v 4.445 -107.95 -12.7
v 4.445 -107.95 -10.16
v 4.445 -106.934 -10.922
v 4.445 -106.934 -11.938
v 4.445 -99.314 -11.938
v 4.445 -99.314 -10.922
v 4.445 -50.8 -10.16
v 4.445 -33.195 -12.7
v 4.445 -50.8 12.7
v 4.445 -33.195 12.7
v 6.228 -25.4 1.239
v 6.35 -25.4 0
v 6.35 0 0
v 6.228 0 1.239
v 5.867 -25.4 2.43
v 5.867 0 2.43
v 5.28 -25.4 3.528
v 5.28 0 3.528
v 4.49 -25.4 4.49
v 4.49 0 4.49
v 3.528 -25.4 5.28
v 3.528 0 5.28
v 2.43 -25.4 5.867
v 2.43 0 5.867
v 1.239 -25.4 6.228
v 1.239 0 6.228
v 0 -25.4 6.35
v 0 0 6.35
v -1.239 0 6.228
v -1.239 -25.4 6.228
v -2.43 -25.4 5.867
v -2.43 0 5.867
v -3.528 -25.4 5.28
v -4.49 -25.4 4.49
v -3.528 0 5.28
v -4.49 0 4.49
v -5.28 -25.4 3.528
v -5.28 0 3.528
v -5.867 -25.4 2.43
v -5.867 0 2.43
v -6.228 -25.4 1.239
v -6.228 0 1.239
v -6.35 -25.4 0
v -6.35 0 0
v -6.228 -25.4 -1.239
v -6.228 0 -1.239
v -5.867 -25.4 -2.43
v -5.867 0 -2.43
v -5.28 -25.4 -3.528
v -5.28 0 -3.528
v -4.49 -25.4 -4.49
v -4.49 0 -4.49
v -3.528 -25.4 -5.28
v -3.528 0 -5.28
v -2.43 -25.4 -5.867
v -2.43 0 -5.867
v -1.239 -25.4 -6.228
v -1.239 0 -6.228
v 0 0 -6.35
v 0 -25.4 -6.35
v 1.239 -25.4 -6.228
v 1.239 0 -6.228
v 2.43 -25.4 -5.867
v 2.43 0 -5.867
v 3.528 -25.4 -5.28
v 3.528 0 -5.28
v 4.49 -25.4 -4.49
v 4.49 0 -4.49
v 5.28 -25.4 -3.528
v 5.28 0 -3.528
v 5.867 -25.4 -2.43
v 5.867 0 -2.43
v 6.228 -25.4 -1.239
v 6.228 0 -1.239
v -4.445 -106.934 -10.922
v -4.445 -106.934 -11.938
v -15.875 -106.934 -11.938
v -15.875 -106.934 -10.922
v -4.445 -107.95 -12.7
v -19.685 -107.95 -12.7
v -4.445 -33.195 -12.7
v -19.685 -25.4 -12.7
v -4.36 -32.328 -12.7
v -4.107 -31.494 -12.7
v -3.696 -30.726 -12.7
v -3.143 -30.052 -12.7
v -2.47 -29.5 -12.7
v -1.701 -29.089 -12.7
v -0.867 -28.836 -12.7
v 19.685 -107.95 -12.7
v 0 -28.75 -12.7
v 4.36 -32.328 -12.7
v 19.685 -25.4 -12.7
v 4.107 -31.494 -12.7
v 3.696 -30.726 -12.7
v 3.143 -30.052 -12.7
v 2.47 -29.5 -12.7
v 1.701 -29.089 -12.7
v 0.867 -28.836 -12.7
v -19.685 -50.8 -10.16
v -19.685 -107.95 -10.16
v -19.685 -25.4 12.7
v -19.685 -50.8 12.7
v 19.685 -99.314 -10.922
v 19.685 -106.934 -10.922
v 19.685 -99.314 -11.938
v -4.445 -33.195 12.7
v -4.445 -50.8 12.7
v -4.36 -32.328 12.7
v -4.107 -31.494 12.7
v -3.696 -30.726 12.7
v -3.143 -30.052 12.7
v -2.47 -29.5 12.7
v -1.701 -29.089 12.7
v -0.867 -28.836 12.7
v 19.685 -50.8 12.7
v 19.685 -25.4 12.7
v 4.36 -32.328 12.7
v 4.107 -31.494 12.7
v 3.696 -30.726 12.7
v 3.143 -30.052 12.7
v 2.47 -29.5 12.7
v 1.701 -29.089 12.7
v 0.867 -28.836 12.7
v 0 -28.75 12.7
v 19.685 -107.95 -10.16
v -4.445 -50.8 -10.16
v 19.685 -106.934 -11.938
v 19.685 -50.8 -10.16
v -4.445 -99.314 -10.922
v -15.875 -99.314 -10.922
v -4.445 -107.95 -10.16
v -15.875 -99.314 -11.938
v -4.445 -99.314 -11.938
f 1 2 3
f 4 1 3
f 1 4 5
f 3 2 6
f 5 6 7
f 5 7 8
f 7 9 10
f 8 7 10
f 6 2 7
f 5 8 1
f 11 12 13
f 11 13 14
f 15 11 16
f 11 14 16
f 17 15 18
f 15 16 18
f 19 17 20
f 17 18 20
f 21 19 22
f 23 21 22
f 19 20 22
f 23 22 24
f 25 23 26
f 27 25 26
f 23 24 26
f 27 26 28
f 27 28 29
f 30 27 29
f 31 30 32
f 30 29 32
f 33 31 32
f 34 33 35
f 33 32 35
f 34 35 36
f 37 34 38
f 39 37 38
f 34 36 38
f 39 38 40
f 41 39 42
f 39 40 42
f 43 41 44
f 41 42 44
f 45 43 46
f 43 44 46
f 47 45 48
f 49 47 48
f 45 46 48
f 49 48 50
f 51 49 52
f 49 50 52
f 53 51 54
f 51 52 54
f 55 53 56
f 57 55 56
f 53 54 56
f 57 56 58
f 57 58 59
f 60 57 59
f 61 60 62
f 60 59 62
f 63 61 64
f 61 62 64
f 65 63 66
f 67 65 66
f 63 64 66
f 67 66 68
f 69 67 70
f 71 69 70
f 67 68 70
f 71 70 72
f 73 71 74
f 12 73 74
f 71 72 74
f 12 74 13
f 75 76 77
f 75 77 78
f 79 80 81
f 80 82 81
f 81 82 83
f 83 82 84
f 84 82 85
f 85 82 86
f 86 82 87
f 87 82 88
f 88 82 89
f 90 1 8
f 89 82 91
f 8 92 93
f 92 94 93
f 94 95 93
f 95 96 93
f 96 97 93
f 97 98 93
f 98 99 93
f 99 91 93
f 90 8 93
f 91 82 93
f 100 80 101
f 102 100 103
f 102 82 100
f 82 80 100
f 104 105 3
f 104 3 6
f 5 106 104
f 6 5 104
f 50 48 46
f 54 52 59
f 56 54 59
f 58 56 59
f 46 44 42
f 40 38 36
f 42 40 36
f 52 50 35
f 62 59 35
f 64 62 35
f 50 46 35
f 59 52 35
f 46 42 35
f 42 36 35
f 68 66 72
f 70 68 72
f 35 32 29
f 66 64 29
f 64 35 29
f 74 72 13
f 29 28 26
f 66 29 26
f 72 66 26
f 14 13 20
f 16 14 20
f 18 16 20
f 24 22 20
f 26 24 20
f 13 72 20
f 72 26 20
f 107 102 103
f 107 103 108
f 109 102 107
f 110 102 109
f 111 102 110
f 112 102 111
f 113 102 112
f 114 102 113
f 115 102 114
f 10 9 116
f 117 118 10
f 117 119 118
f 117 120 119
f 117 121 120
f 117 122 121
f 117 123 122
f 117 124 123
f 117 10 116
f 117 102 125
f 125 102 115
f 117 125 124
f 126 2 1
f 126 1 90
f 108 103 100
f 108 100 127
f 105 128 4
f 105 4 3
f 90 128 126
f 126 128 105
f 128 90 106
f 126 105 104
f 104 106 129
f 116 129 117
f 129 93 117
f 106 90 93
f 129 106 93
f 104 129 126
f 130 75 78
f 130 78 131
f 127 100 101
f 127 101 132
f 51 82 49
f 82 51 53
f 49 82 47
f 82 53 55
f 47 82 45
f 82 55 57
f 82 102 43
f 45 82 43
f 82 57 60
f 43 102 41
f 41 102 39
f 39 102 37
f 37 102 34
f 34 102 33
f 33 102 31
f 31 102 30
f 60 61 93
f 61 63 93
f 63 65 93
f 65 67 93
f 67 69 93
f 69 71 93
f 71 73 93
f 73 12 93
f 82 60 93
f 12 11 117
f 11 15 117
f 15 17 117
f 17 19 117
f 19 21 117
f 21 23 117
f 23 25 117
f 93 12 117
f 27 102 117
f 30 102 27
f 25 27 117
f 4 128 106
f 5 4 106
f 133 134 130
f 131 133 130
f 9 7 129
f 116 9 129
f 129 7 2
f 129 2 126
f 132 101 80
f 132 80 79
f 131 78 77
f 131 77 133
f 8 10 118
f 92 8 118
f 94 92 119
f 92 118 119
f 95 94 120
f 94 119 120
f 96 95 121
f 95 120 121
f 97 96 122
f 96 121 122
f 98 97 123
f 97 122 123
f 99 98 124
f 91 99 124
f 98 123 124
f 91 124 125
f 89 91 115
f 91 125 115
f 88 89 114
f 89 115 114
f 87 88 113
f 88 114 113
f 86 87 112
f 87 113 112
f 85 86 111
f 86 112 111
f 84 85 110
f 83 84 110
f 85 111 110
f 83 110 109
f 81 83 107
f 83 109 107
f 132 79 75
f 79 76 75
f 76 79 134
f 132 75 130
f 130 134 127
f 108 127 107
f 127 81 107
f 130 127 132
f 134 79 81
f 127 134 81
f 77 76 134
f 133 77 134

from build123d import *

# Parameters (mm, degrees)
F0_R     = 6.35
F1_DEPTH = 25.4
F2_W     = 39.37
F2_H     = 25.4
F3_DEPTH = 25.4
F5_DEPTH = 25.4
F6_W     = 15.24
F6_H     = 2.54
F7_DEPTH = 57.15
F8_W     = 7.62
F8_H     = 1.016
F9_DEPTH = 35.56


with BuildPart() as f1:
    # F0 (on Front) → F1 (new body)
    with BuildSketch(Plane.XZ):
        Circle(F0_R)
    extrude(amount=F1_DEPTH)

    # F2 (on face) → F3 (join)
    with BuildSketch(Plane.XZ.offset(25.4)):
        Rectangle(F2_W, F2_H)
    extrude(amount=F3_DEPTH)

    # F4 (on face) → F5 (cut)
    with BuildSketch(Plane.XY.offset(12.7)):
        with BuildLine():
            Line((-4.445, -33.1953875721), (-4.445, -50.8))
            Line((-4.445, -50.8), (4.445, -50.8))
            Line((4.445, -50.8), (4.445, -33.1953875721))
            ThreePointArc((4.445, -33.1953875721), (0, -37.6403875721), (-4.445, -33.1953875721))
        make_face()
        with BuildLine():
            ThreePointArc((4.445, -33.1953875721), (0, -28.7503875721), (-4.445, -33.1953875721))
            Line((-4.445, -33.1953875721), (4.445, -33.1953875721))
        make_face()
        with BuildLine():
            Line((4.445, -33.1953875721), (-4.445, -33.1953875721))
            ThreePointArc((-4.445, -33.1953875721), (0, -37.6403875721), (4.445, -33.1953875721))
        make_face()
    extrude(amount=-F5_DEPTH, mode=Mode.SUBTRACT)

    # F6 (on face) → F7 (join)
    with BuildSketch(Plane.XZ.offset(50.8)):
        with Locations((-12.065, -11.43)):
            Rectangle(F6_W, F6_H)
        with Locations((12.065, -11.43)):
            Rectangle(F6_W, F6_H)
    extrude(amount=F7_DEPTH)

    # F8 (on face) → F9 (cut)
    with BuildSketch(Plane.YZ.offset(19.685)):
        with Locations((-103.124, -11.43)):
            Rectangle(F8_W, F8_H)
    extrude(amount=-F9_DEPTH, mode=Mode.SUBTRACT)


solid = f1.part
